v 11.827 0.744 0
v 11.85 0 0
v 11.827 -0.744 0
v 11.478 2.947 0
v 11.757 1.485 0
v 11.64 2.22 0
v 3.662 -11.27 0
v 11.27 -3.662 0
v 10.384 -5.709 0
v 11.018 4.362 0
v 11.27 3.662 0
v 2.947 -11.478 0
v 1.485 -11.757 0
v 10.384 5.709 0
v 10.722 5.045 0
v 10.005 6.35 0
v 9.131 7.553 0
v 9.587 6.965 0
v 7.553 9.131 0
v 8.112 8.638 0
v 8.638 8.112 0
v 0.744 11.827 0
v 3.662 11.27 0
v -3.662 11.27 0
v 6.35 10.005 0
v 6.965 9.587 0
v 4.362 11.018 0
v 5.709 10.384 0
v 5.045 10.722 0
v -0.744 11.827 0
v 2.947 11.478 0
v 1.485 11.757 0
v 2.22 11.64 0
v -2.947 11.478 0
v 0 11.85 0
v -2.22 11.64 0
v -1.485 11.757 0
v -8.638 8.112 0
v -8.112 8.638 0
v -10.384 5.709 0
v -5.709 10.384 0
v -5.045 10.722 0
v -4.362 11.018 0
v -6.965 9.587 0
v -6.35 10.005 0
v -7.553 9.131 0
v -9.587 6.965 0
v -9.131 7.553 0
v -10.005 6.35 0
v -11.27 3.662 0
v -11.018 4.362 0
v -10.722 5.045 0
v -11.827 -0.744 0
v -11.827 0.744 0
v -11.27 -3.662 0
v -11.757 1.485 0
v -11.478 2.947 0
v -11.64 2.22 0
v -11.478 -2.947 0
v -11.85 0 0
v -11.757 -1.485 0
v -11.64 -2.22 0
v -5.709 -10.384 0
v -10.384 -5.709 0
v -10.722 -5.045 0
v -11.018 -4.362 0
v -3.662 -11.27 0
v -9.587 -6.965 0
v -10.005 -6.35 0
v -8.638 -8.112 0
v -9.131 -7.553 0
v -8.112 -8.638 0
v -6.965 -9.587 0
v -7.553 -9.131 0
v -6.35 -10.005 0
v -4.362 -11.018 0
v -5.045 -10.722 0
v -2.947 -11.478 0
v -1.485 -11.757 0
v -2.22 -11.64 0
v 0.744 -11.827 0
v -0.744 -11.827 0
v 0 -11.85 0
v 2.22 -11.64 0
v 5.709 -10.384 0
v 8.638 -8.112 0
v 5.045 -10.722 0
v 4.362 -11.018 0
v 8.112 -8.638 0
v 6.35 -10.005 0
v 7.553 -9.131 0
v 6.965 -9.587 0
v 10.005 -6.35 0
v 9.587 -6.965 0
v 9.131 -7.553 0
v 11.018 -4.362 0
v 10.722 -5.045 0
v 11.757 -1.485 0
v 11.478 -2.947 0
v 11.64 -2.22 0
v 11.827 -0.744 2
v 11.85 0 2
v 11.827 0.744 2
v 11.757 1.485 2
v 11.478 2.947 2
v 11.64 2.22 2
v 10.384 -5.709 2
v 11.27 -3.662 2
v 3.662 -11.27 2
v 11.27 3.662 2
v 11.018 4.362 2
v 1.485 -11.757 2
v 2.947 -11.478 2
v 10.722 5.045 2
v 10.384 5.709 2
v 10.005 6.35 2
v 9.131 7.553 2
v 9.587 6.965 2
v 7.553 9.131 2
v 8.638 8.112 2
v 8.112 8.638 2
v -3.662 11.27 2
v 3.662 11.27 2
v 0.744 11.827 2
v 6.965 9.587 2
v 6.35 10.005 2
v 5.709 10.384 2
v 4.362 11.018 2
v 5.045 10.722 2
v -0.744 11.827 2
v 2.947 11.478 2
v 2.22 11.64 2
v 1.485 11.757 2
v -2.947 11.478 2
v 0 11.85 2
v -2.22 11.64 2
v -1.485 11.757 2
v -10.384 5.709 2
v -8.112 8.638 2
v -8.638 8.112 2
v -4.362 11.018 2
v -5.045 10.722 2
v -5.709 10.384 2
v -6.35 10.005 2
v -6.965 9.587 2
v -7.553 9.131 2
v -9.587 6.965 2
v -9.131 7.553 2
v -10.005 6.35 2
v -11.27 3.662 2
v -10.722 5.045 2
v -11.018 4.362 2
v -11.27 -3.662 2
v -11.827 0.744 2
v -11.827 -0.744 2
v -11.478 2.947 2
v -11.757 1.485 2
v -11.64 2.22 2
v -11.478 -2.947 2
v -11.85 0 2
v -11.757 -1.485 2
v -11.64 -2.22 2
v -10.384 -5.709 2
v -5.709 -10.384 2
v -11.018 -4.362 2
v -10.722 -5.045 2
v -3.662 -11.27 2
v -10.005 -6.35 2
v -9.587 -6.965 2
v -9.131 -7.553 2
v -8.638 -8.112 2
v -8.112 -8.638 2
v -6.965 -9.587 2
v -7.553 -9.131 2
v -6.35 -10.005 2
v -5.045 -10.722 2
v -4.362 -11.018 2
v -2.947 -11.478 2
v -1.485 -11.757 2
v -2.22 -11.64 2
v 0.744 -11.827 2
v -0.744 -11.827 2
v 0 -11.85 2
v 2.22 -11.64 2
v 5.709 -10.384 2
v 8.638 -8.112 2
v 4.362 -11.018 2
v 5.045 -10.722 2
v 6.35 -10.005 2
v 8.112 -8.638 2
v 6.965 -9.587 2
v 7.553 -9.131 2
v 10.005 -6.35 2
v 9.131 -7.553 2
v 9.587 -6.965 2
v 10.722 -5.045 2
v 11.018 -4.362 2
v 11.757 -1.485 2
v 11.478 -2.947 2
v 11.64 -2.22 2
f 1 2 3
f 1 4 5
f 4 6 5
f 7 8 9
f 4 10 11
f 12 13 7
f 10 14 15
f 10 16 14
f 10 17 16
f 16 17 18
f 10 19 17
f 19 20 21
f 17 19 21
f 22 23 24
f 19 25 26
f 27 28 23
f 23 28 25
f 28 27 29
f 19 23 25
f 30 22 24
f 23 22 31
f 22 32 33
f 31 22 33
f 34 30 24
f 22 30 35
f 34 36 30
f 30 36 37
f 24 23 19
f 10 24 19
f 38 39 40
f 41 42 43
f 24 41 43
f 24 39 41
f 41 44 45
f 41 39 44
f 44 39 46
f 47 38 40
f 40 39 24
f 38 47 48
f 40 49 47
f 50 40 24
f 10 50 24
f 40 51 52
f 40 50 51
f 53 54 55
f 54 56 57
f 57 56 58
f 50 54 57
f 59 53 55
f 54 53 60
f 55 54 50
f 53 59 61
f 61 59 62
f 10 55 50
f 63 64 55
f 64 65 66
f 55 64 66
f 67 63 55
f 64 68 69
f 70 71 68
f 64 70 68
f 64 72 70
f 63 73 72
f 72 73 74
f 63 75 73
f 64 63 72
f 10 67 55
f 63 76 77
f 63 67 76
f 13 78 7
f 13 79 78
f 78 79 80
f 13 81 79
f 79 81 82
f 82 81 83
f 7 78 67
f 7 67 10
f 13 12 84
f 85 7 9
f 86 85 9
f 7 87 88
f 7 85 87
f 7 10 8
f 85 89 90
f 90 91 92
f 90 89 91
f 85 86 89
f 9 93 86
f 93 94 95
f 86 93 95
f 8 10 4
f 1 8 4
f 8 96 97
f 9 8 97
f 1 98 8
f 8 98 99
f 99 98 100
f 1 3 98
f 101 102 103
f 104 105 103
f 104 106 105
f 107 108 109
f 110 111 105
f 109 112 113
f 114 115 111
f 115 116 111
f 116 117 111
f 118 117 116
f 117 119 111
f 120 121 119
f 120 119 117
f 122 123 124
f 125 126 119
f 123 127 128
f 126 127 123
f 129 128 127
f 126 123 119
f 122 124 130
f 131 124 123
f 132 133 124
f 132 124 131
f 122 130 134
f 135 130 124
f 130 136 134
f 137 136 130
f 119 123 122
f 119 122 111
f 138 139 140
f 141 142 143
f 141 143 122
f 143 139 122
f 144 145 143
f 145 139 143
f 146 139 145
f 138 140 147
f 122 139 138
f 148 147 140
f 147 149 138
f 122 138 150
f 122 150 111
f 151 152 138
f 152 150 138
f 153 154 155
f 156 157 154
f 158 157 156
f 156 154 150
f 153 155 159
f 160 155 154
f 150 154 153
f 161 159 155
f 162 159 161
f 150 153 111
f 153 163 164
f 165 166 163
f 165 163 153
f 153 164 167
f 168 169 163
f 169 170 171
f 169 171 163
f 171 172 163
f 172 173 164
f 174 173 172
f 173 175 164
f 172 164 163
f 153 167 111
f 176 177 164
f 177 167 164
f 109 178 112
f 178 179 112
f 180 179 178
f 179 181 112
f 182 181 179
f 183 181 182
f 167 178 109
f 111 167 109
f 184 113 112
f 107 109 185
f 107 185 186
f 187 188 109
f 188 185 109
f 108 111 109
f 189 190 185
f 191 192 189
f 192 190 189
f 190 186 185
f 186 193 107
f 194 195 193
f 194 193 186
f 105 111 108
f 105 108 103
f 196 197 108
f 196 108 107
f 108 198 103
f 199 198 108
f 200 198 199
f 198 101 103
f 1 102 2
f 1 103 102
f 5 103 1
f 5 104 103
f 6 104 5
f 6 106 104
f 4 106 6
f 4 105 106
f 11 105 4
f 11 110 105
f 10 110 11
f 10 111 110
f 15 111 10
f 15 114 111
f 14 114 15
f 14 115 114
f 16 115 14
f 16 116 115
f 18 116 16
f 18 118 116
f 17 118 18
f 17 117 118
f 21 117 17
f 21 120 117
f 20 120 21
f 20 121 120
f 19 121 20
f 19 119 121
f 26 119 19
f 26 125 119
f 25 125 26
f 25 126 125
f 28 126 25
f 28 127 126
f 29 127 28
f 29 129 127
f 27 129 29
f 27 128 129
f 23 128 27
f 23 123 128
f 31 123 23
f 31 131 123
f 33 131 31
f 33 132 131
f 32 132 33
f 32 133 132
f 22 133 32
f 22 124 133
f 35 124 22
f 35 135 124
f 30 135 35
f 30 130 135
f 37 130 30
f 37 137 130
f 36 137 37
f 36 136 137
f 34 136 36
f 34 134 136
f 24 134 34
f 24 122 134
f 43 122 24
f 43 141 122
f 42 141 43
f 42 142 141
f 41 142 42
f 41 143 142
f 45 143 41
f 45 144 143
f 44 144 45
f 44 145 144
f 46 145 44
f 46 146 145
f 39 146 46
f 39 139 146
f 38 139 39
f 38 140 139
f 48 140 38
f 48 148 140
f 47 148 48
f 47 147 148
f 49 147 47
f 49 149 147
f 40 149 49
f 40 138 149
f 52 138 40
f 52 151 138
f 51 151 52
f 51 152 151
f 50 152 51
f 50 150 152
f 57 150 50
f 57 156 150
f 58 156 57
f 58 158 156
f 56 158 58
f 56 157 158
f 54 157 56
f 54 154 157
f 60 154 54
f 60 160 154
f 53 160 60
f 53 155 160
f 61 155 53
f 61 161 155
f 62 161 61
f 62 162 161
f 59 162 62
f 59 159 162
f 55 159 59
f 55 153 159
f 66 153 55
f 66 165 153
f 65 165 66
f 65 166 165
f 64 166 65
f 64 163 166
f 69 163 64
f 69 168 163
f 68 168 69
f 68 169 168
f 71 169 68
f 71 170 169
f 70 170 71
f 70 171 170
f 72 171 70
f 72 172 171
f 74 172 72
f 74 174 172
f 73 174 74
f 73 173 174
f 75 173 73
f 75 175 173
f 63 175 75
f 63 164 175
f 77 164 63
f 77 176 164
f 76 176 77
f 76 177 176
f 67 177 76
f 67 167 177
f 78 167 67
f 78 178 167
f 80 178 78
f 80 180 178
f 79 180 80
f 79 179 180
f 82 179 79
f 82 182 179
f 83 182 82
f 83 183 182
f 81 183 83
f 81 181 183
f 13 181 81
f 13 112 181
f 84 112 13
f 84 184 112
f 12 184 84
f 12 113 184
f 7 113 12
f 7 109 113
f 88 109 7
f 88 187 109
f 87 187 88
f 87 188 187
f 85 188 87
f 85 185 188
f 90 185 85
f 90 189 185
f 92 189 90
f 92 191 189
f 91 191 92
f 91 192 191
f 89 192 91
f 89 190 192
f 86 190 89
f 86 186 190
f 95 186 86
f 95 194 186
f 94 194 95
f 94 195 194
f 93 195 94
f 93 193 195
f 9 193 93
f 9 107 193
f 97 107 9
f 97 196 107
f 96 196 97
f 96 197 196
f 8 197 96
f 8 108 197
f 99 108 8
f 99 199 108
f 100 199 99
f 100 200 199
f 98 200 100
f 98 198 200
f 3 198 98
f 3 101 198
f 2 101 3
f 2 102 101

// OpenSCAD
$fn=100;
linear_extrude(2) circle(11.85);

intersection() {
    scale([0.5,0.5,0.5]) surface("ribbon1.png", center=true);
    linear_extrude(2.6) circle(12);
}
